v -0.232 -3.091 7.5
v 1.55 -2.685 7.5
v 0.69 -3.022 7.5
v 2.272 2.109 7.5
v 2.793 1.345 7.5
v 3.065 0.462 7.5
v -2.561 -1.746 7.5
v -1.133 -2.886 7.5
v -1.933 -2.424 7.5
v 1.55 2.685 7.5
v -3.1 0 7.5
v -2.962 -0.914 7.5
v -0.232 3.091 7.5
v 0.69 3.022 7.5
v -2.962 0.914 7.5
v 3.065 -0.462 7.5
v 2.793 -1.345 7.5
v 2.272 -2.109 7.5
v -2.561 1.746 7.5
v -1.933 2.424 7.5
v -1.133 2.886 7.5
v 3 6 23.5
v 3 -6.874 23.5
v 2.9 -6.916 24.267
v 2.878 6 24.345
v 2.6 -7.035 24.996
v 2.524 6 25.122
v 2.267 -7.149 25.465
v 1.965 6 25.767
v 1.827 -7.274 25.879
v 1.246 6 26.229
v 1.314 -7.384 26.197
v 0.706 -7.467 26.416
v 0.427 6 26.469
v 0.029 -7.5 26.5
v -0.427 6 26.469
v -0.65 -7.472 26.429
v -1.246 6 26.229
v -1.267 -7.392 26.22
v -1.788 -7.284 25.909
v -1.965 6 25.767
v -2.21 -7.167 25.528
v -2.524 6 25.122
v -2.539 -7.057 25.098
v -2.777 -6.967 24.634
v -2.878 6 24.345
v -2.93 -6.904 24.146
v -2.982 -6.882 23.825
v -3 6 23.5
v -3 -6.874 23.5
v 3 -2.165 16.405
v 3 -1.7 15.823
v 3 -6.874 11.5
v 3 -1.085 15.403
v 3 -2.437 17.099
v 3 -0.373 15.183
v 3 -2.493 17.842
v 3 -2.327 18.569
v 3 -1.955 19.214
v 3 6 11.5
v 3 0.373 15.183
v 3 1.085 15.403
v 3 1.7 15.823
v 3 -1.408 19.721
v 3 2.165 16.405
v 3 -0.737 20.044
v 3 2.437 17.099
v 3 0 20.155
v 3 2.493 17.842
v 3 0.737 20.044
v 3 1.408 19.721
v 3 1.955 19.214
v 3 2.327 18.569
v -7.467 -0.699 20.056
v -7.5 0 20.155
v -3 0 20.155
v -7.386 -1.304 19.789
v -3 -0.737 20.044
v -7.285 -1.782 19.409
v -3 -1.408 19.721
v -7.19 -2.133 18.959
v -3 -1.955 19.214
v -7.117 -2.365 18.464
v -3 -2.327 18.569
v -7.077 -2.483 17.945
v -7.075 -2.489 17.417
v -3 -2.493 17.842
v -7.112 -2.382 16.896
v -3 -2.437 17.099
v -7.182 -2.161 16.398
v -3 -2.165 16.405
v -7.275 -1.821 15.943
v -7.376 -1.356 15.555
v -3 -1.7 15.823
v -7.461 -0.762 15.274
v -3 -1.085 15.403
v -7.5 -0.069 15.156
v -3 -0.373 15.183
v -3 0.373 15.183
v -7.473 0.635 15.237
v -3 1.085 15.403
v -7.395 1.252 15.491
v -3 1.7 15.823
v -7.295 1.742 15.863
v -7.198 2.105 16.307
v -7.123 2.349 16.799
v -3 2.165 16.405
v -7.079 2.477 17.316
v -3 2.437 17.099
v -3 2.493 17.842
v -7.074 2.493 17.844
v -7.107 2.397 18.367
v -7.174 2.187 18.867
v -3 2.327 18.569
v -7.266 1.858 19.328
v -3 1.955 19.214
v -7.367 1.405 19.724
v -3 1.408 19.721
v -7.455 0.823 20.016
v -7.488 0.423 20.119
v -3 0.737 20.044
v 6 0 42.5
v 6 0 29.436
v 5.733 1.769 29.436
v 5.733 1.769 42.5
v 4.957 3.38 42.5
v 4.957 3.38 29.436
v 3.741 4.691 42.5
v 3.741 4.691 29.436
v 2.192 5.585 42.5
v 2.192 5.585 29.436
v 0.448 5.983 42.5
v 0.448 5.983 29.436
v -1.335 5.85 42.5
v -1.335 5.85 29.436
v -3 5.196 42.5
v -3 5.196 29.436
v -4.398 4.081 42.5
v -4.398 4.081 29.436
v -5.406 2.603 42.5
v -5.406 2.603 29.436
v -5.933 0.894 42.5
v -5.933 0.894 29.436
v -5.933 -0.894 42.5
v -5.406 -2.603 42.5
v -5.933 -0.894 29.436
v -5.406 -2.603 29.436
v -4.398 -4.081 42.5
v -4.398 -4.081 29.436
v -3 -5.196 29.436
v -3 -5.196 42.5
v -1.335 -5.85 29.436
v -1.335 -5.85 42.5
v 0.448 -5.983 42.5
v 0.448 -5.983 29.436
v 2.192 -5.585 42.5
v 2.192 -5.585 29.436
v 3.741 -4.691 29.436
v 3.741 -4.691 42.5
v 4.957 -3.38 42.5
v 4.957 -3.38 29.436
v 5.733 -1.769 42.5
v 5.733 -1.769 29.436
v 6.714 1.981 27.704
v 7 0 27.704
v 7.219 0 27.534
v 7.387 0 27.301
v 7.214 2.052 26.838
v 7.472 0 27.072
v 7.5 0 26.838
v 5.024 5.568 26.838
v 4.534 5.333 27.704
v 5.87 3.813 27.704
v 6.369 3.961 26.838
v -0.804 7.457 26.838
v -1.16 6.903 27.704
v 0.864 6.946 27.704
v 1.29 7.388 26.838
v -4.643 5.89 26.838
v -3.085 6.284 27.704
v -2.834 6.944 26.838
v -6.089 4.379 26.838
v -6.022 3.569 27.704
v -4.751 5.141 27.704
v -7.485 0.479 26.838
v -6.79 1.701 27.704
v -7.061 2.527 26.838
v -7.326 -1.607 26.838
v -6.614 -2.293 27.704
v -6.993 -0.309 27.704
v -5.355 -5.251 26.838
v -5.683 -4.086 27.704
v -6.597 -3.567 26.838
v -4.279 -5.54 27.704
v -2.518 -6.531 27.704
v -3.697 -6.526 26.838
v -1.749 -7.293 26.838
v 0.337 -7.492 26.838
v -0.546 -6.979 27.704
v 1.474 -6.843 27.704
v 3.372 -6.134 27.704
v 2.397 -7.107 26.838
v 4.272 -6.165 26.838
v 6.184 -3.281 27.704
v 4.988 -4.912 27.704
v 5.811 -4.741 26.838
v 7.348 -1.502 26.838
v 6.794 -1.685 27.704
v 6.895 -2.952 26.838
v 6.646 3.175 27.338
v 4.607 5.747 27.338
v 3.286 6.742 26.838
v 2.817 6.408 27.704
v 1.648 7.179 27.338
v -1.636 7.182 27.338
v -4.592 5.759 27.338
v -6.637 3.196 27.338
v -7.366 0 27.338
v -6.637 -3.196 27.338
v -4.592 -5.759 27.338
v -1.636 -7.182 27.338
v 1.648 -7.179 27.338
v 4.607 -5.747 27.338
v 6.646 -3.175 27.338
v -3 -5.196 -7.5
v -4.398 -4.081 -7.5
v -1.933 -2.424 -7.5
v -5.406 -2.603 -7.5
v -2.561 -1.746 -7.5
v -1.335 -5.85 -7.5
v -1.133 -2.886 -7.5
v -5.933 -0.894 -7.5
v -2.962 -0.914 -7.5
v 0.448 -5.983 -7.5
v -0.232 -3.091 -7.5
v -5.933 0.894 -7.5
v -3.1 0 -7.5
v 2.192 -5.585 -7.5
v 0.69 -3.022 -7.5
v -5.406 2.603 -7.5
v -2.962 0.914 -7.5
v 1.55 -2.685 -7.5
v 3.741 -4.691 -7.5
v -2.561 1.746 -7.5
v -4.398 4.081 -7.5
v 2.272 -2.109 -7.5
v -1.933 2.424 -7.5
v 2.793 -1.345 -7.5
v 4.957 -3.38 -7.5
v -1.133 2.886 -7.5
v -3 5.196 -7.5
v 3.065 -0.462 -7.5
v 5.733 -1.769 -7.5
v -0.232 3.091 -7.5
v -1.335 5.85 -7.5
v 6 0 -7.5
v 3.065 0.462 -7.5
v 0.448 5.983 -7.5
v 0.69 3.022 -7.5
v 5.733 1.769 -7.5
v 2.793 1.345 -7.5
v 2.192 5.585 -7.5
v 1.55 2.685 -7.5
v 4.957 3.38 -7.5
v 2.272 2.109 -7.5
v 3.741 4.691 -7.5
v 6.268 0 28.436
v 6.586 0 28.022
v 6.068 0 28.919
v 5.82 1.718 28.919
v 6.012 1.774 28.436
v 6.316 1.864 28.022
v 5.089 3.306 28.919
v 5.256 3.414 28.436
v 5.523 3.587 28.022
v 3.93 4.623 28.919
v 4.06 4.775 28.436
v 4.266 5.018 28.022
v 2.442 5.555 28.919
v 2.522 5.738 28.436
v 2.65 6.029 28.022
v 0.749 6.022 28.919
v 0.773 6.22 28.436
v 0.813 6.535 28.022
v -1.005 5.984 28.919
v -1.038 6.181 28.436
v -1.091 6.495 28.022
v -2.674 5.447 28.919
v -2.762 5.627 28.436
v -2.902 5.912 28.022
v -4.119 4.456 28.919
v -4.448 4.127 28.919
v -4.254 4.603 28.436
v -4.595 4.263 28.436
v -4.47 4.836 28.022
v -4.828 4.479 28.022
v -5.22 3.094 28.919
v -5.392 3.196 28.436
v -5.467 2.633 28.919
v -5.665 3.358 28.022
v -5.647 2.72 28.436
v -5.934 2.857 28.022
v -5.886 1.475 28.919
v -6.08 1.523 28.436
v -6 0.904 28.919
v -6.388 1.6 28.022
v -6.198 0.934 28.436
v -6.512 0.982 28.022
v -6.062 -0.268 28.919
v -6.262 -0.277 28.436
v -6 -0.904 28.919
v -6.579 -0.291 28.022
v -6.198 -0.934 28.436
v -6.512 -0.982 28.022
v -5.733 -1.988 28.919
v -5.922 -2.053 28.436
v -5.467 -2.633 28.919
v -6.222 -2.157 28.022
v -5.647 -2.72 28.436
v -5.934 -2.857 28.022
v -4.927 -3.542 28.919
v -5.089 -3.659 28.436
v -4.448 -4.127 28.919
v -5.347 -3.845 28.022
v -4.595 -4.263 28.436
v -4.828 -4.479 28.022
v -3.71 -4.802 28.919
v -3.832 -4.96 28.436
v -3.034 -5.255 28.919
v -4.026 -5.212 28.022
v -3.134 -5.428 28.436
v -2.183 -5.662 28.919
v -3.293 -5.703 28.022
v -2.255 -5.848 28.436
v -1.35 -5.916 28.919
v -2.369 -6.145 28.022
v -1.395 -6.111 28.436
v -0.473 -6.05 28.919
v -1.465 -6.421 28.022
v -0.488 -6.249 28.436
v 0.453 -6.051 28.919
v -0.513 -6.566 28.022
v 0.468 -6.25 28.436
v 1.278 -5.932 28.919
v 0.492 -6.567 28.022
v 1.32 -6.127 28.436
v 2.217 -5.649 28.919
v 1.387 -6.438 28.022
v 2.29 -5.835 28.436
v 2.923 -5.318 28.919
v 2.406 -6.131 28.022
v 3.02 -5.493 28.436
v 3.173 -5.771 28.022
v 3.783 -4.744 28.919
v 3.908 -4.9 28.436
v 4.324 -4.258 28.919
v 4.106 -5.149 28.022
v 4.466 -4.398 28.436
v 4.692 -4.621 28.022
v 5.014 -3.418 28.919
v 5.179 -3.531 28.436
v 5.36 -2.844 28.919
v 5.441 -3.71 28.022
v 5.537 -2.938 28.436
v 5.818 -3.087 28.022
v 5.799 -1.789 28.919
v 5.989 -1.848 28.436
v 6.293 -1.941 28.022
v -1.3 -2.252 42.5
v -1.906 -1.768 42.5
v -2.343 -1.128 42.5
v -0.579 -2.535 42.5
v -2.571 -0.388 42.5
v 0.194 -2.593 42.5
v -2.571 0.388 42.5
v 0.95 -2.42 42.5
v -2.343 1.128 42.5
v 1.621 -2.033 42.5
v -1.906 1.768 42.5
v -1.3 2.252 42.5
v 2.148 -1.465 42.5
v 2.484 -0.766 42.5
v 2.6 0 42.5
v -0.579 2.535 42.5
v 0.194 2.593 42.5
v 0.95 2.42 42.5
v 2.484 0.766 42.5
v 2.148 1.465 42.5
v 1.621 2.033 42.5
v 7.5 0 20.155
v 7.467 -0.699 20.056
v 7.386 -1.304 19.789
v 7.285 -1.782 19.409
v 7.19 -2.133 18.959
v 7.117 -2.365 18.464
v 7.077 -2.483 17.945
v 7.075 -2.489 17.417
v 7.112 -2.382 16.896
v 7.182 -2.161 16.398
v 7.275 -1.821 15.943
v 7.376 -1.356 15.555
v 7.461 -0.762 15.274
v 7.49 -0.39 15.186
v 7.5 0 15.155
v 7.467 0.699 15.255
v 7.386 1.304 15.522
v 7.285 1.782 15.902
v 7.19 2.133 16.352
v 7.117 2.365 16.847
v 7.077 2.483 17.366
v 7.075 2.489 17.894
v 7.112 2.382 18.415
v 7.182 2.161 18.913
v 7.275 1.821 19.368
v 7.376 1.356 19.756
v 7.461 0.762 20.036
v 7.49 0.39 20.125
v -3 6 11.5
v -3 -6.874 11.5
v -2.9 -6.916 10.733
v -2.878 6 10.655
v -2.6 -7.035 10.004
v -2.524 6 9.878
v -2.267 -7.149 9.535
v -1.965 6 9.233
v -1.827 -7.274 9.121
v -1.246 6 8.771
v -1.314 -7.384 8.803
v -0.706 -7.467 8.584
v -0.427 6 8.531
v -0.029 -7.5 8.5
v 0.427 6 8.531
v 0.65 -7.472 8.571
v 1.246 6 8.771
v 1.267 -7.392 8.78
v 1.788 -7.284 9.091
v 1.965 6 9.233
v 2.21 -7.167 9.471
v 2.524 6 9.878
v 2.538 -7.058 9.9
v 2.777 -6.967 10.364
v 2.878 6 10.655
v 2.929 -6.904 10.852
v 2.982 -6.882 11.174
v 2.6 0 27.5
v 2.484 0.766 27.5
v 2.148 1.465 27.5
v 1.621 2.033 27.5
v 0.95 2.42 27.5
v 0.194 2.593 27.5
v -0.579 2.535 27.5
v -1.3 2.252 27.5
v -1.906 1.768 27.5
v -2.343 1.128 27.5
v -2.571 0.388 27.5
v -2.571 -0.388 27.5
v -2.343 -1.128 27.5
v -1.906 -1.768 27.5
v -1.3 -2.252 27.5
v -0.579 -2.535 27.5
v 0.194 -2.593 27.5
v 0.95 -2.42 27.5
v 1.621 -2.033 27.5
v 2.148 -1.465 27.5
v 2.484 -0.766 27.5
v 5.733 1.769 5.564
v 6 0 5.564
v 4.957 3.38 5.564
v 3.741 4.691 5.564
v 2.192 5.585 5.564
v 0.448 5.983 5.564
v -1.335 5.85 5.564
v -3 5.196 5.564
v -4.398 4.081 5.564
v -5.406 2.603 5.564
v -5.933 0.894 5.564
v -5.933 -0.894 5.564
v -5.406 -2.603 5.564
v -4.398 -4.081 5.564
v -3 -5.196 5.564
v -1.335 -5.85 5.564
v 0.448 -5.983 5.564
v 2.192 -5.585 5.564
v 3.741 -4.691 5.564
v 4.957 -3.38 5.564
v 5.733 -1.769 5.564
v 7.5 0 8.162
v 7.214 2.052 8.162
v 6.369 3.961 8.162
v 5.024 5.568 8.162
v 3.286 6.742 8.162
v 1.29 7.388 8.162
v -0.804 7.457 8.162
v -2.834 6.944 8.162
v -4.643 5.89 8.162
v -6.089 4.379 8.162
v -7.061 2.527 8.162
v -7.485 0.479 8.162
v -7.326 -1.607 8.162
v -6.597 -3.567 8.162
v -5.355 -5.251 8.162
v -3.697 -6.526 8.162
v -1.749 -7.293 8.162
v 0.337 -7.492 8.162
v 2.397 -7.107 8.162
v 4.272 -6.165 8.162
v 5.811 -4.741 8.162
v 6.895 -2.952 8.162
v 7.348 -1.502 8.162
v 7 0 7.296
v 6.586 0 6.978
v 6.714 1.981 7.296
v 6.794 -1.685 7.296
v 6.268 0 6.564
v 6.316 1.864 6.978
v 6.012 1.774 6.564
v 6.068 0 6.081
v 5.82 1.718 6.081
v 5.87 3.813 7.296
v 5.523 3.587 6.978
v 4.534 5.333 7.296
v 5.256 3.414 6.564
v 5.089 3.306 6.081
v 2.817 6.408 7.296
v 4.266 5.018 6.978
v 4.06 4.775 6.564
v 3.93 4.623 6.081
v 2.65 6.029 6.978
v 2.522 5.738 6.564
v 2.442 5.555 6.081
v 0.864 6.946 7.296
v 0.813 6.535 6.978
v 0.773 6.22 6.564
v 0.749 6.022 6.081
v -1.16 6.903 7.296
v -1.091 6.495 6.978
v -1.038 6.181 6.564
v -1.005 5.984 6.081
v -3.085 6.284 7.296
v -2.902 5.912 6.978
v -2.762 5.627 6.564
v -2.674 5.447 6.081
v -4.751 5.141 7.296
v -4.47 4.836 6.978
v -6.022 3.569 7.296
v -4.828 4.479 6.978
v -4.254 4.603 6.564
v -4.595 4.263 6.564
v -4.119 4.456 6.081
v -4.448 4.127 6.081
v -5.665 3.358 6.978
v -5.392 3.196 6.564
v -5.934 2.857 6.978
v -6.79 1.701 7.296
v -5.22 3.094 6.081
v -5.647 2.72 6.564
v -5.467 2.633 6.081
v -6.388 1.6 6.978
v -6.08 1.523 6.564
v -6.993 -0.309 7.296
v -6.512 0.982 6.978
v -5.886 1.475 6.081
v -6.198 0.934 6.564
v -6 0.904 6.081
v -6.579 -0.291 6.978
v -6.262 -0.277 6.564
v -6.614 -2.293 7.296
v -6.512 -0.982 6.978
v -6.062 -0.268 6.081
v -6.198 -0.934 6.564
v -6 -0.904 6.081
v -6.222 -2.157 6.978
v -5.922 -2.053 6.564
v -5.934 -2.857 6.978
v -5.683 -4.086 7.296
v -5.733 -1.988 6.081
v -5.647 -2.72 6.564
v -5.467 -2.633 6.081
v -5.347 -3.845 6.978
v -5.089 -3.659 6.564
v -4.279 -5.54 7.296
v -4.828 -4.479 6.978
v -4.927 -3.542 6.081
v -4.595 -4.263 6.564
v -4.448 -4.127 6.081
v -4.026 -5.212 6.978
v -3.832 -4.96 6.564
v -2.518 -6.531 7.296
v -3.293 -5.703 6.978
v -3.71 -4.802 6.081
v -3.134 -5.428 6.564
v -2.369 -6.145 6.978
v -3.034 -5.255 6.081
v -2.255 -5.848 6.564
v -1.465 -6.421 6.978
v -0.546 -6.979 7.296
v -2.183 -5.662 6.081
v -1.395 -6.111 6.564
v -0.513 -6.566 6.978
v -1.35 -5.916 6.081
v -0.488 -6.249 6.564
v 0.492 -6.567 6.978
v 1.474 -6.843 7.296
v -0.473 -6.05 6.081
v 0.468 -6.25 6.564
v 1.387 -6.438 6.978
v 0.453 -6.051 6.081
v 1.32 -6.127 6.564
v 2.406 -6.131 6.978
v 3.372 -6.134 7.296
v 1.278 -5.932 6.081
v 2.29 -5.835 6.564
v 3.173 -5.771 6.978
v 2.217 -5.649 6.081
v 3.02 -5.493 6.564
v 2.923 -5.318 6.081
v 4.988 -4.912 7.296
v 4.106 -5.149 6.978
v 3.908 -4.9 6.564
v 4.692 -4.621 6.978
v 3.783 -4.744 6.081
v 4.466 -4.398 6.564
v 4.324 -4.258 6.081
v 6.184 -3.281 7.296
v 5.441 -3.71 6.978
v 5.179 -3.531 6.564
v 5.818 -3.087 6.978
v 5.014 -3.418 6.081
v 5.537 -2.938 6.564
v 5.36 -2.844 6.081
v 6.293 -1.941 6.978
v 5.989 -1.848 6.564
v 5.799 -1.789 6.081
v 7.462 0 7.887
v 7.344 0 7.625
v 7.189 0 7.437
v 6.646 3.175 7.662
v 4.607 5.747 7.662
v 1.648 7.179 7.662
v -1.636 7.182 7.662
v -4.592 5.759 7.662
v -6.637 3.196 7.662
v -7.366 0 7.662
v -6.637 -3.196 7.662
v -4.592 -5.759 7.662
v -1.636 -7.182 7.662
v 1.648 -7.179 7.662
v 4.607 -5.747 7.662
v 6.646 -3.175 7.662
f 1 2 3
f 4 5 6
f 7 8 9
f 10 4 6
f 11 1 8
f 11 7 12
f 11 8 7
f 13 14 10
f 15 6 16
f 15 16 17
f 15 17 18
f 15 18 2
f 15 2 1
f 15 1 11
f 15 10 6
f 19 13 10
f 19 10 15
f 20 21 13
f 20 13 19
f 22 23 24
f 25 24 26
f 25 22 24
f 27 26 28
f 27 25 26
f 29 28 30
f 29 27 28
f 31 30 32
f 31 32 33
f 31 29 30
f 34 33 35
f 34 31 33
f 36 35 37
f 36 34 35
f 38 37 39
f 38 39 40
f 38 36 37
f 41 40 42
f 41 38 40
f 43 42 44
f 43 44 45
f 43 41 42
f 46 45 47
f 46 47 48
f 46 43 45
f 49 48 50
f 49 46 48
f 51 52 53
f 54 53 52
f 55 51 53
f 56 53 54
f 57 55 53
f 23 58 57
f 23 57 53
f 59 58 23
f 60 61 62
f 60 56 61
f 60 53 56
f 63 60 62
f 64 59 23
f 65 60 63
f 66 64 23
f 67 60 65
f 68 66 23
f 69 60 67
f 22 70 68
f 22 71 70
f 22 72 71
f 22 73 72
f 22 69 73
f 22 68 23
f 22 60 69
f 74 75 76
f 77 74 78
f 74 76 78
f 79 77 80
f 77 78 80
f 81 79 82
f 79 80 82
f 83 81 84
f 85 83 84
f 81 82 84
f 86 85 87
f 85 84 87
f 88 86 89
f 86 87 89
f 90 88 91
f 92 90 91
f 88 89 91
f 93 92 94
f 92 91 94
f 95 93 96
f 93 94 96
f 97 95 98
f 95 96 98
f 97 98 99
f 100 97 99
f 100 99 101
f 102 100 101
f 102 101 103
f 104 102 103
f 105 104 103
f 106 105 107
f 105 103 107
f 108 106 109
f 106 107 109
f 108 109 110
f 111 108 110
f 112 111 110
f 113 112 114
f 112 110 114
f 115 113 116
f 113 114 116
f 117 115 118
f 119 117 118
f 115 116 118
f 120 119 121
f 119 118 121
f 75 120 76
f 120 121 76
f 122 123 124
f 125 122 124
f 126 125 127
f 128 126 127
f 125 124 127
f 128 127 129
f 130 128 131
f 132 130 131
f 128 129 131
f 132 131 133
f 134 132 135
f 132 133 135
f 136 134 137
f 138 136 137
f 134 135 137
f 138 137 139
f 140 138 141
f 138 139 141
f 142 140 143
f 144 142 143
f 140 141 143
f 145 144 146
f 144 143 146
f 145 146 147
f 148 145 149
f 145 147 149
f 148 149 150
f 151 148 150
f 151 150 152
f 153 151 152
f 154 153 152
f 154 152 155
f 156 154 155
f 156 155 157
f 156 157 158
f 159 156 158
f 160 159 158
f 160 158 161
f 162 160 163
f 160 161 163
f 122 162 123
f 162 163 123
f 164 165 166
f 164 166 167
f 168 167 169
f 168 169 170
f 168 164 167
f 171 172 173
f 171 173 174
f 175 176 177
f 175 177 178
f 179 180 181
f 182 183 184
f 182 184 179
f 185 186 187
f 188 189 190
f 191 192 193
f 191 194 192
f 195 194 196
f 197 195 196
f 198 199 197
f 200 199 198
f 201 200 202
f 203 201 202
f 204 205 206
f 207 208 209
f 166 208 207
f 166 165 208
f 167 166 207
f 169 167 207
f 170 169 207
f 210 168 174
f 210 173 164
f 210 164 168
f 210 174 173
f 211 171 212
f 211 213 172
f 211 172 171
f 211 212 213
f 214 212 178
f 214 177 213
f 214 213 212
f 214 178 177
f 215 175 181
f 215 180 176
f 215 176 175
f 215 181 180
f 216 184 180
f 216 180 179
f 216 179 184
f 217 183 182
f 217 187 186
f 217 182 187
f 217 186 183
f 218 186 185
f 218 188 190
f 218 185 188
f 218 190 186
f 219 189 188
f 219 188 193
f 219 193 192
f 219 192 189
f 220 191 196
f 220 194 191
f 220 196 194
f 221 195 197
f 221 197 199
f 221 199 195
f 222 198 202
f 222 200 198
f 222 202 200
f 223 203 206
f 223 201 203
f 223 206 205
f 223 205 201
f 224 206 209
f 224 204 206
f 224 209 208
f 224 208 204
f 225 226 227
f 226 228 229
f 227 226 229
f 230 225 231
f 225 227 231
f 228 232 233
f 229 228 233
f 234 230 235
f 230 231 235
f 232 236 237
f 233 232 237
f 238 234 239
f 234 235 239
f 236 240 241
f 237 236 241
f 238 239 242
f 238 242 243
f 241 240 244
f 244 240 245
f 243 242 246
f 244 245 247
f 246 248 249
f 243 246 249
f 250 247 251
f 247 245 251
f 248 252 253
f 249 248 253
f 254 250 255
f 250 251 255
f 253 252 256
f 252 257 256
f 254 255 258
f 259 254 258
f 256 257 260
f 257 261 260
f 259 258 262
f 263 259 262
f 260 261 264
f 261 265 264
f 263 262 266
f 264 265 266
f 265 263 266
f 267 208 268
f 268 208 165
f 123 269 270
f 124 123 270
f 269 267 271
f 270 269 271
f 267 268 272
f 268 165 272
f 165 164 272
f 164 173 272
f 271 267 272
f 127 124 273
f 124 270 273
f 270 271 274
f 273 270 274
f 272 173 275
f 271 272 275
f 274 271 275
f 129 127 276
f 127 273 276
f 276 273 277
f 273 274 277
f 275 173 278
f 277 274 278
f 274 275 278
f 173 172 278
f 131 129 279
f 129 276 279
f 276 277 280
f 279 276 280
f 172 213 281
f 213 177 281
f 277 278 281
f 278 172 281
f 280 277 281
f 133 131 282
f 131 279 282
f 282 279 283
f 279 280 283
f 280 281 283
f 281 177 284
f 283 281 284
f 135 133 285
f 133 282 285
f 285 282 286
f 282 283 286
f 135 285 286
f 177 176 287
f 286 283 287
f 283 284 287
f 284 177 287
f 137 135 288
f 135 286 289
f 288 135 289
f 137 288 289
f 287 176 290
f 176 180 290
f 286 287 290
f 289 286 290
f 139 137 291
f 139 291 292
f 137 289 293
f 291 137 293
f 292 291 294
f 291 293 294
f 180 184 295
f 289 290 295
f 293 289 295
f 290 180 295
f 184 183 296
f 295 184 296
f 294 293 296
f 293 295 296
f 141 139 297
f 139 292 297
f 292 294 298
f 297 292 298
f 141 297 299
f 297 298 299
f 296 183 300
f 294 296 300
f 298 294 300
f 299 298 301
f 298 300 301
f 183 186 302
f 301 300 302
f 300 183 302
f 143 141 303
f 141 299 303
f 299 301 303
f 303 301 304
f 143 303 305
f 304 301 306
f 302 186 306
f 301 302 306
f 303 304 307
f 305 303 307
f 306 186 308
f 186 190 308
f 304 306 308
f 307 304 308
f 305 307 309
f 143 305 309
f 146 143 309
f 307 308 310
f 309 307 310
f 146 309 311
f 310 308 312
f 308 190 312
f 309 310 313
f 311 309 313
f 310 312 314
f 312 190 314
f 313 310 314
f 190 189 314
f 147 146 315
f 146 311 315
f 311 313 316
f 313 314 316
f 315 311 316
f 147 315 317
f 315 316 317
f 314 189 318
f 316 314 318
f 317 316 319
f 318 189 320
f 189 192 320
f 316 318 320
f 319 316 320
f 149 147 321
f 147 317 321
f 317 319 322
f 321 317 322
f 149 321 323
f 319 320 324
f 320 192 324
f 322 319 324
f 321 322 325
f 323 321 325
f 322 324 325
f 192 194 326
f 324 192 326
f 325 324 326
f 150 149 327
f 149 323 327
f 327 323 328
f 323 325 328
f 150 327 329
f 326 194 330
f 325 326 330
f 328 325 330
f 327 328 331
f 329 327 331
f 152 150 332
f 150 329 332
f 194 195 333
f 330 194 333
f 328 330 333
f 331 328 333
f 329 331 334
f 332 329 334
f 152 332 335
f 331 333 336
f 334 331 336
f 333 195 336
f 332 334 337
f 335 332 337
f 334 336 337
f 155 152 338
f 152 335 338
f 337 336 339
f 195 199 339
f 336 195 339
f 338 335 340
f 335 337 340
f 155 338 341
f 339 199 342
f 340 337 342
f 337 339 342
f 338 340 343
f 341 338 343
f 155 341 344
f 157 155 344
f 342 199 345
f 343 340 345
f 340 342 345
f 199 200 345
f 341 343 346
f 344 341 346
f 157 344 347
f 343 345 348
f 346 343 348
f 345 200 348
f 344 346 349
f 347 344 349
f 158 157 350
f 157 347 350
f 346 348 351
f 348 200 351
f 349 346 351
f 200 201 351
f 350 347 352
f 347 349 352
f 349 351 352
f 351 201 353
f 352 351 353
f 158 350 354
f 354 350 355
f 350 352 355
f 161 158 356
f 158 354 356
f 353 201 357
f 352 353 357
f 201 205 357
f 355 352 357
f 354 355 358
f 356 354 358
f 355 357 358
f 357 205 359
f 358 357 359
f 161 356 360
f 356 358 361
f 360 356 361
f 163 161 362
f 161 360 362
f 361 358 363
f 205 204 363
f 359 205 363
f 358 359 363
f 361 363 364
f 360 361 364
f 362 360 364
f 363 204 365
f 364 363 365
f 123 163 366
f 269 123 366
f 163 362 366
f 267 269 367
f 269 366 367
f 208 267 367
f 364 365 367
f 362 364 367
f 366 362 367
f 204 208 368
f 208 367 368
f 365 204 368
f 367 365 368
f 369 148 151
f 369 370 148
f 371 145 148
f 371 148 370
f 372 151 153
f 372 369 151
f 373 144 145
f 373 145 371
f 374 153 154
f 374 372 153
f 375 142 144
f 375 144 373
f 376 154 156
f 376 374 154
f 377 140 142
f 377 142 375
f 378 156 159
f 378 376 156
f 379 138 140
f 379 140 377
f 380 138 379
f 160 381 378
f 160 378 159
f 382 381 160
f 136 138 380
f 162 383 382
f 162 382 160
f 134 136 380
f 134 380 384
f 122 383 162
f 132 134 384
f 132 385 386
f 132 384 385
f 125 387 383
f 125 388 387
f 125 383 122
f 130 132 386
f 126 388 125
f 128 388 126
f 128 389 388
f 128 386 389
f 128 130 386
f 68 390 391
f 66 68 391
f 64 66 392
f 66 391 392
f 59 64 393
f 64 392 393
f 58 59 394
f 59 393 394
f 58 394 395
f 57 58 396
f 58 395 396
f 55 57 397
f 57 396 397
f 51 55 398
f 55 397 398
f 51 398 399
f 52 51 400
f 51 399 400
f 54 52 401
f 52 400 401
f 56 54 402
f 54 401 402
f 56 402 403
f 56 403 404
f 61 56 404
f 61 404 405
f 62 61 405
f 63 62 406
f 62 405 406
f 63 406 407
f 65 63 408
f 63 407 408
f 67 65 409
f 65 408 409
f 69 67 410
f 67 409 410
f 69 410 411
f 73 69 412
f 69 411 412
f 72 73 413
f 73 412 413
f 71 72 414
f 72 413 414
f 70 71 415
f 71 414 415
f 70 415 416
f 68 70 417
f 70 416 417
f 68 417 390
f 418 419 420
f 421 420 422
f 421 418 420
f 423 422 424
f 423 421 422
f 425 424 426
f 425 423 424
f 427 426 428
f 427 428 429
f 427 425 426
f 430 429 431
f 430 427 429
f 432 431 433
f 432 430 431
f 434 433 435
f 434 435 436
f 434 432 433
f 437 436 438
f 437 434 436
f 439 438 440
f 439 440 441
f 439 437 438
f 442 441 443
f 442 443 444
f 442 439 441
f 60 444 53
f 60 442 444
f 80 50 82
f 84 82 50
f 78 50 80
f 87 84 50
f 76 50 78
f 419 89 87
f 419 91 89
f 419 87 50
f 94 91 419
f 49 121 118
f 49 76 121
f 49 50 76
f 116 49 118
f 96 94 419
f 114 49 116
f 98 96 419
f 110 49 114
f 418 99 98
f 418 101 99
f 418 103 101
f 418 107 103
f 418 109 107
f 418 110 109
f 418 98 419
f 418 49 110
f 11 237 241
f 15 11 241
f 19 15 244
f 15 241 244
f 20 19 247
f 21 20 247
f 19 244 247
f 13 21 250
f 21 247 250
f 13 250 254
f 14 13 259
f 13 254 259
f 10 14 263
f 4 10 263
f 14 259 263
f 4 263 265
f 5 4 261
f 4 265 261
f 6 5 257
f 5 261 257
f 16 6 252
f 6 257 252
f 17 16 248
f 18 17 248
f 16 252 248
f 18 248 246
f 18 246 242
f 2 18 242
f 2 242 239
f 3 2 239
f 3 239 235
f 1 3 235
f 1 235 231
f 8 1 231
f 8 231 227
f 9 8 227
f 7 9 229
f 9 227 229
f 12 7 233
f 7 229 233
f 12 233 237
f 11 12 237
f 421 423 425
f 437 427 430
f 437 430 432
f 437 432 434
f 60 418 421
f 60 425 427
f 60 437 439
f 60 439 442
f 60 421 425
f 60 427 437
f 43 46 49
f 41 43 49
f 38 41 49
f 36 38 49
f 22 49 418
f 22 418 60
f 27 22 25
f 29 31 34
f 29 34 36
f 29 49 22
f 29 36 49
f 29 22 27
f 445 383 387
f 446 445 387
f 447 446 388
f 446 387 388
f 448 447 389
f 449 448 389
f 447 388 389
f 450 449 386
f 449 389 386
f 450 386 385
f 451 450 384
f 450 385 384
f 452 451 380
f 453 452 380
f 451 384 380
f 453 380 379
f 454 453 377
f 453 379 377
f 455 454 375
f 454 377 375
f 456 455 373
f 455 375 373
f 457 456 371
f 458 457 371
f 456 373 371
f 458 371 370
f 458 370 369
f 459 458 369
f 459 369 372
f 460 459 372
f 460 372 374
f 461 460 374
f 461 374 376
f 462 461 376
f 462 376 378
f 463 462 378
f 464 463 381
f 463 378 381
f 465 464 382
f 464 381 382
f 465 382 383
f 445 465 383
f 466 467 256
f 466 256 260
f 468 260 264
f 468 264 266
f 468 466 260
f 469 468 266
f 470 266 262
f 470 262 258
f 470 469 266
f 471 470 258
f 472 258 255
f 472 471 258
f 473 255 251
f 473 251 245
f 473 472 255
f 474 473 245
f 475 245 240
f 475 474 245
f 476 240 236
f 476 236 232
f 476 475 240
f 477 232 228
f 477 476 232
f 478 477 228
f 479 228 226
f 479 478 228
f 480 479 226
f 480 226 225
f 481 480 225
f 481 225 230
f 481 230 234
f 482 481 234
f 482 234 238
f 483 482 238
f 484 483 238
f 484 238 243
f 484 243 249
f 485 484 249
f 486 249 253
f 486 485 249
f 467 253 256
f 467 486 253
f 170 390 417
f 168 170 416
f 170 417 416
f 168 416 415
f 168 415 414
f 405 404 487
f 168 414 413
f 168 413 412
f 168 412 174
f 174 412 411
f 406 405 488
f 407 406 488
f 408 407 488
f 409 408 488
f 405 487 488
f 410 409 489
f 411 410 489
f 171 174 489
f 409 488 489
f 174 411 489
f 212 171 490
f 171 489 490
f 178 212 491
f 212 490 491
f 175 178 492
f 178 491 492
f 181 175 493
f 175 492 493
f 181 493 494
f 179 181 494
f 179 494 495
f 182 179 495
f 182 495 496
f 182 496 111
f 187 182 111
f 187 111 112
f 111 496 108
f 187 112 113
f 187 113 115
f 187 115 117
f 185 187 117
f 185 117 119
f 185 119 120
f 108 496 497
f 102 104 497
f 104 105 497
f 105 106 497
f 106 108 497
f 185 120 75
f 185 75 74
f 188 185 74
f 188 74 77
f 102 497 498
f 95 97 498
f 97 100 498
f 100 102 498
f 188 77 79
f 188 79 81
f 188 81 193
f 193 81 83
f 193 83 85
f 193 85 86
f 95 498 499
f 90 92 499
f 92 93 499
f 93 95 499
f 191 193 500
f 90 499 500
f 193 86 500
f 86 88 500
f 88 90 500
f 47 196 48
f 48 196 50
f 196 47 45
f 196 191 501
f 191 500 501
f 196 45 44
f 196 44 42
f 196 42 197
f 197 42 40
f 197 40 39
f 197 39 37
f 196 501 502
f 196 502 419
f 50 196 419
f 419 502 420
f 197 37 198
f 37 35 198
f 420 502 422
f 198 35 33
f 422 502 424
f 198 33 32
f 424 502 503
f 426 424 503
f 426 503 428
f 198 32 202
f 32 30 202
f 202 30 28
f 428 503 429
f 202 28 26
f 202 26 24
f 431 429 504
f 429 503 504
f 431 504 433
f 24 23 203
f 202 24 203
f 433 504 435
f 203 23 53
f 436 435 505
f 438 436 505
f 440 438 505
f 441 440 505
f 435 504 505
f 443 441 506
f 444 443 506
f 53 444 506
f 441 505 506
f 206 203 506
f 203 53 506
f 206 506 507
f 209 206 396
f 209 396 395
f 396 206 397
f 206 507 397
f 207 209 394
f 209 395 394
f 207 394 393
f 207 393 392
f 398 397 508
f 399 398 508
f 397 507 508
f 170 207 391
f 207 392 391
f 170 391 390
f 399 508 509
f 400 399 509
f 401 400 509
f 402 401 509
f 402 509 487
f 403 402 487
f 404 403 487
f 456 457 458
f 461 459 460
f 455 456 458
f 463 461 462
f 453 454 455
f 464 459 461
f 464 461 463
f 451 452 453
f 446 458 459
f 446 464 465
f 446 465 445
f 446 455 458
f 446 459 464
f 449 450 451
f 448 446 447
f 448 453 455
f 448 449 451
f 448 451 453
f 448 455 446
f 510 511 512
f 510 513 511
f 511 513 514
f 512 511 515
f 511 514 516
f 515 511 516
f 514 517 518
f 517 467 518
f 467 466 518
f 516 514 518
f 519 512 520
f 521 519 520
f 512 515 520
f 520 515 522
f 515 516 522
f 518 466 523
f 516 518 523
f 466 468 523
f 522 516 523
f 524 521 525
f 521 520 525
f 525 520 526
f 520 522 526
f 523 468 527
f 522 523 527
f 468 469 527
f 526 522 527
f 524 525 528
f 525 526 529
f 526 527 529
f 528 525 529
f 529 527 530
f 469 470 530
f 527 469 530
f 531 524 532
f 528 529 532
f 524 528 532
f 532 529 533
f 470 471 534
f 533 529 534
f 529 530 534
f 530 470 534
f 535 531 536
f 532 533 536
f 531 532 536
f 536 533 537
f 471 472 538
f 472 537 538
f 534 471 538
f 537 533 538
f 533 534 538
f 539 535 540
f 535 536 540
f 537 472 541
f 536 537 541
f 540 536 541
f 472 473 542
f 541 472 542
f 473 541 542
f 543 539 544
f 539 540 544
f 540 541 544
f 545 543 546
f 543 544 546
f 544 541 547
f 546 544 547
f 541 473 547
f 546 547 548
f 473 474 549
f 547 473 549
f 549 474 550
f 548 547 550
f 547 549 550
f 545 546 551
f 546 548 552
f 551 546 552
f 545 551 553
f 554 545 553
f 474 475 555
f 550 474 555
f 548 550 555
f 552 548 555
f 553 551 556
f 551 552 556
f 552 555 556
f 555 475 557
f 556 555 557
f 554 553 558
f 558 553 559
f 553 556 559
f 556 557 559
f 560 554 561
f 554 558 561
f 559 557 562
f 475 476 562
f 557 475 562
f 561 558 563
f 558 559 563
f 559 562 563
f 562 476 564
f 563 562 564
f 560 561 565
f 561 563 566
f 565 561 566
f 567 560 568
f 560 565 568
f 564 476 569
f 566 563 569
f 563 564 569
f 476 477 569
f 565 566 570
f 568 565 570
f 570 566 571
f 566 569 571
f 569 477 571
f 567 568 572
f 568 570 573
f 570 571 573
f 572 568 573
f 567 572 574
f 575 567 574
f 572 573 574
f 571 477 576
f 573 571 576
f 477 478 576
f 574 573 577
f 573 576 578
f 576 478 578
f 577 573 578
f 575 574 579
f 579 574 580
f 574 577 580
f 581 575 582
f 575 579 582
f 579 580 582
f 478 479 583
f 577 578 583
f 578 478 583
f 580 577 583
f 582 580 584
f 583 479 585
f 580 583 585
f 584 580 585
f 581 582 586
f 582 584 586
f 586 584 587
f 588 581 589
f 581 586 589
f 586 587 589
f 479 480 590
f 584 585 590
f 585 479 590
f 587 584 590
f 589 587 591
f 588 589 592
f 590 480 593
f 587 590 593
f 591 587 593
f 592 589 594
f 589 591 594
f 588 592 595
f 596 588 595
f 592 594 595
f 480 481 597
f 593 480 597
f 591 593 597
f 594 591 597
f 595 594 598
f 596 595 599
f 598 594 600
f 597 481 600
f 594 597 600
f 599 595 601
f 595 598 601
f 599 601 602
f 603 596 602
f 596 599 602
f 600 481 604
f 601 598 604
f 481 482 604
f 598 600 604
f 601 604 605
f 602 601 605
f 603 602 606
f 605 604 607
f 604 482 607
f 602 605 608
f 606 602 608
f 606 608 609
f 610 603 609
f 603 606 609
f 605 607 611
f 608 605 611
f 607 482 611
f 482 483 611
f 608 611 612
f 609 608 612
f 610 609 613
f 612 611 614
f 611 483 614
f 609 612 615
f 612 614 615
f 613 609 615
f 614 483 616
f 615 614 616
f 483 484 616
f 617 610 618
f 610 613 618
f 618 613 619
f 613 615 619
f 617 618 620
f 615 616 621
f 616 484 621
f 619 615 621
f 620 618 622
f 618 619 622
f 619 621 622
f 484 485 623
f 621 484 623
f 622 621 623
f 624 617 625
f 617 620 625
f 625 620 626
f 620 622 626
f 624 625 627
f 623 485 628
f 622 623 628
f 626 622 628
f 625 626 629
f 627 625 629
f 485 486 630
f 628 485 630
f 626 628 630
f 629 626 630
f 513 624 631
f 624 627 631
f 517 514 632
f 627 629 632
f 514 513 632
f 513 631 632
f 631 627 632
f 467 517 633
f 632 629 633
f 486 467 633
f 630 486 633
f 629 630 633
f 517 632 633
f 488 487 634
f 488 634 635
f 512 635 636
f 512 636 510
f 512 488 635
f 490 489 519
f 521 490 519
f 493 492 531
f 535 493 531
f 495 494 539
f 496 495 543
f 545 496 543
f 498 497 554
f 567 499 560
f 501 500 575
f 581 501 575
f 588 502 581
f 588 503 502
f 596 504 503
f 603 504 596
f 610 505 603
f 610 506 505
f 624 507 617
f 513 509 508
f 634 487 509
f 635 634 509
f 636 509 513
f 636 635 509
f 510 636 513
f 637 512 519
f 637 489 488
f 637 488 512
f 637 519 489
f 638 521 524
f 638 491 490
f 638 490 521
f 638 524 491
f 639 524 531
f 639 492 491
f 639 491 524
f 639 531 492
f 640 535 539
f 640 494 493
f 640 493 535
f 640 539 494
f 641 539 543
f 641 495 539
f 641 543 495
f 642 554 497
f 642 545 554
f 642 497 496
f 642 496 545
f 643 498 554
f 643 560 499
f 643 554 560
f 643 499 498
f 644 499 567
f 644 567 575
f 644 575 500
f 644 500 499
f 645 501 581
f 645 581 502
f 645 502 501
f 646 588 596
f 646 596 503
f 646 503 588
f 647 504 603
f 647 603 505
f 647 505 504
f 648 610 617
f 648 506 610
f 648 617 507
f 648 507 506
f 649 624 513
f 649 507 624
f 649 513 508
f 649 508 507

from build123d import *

# Parameters (mm, degrees)
SKETCH1_R           = 6
BOSS_EXTRUDE1_DEPTH = 7.5
SKETCH2_R           = 7.5
BOSS_EXTRUDE2_DEPTH = 20
SKETCH3_R           = 3.1
CUT_EXTRUDE1_DEPTH  = 15
SKETCH4_R           = 2.5
CUT_EXTRUDE2_DEPTH  = 11
CUT_EXTRUDE3_DEPTH  = 20
FILLET1_R           = 2
FILLET2_R           = 1
SKETCH7_R           = 2.6
CUT_EXTRUDE4_DEPTH  = 15
CUT_EXTRUDE5_START  = -6
CUT_EXTRUDE5_DEPTH  = 6


with BuildPart() as part:
    # Sketch1 → Boss-Extrude1 (new, symmetric)
    with BuildSketch(Plane.XY):
        Circle(SKETCH1_R)
    boss_extrude1 = extrude(amount=BOSS_EXTRUDE1_DEPTH, both=True)

    # Sketch2 → Boss-Extrude2 (add)
    with BuildSketch(Plane.XY.offset(7.5)):
        Circle(SKETCH2_R)
    extrude(amount=BOSS_EXTRUDE2_DEPTH)

    # Mirror1: Boss-Extrude1 across plane
    add(boss_extrude1.mirror(Plane.XY.offset(17.5)))

    # Sketch3 → Cut-Extrude1 (cut)
    with BuildSketch(Plane(origin=(0, 0, -7.5), x_dir=(-1, 0, 0), z_dir=(0, 0, -1))):
        Circle(SKETCH3_R)
    extrude(amount=-CUT_EXTRUDE1_DEPTH, mode=Mode.SUBTRACT)

    # Sketch4 → Cut-Extrude2 (cut, symmetric)
    with BuildSketch(Plane(origin=(0, 0, 0), x_dir=(0, 0, -1), z_dir=(1, 0, 0))):
        with Locations(Location((-17.655484387, 0, 0), (0, 0, 180))):
            Circle(SKETCH4_R)
    extrude(amount=CUT_EXTRUDE2_DEPTH, both=True, mode=Mode.SUBTRACT)

    # Sketch6 → Cut-Extrude3 (cut)
    with BuildSketch(Plane(origin=(0, 0, 0), x_dir=(1, 0, 0), z_dir=(0, 1, 0))):
        with BuildLine():
            Line((3, -11.5), (3, -23.5))
            ThreePointArc((3, -23.5), (0, -26.5), (-3, -23.5))
            Line((-3, -23.5), (-3, -11.5))
            ThreePointArc((-3, -11.5), (0, -8.5), (3, -11.5))
        make_face()
    extrude(amount=-CUT_EXTRUDE3_DEPTH, mode=Mode.SUBTRACT)

    # Fillet1
    # the kernel refuses this fillet: 2 mm, written as the material it adds along each edge
    with BuildSketch(Plane(origin=(0, 0, 7.5), x_dir=(1, 0, 0), z_dir=(0, -1, 0))) as fillet1_piece_1:
        with BuildLine():
            CenterArc((8, -1.936491673), FILLET1_R, 104.477512186, 75.522487814)
            Line((6, -1.936491673), (5.96, -1.936491673))
            Line((5.96, -1.936491673), (5.96, 0))
            Line((5.96, 0), (6, 0.04))
            ThreePointArc((6, 0.04), (6.75, 0.04), (7.49, 0.038729833))
            Line((7.49, 0.038729833), (7.5, 0))
        make_face()
    revolve(axis=Axis((0, 0, 7.5), (0, 0, 1)))
    with BuildSketch(Plane(origin=(0, 0, 27.5), x_dir=(1, 0, 0), z_dir=(0, -1, 0))) as fillet1_piece_2:
        with BuildLine():
            CenterArc((8, 1.936491673), FILLET1_R, 180, 75.522487814)
            Line((6, 1.936491673), (5.96, 1.936491673))
            Line((5.96, 1.936491673), (5.96, 0))
            Line((5.96, 0), (6, -0.04))
            ThreePointArc((6, -0.04), (6.75, -0.04), (7.49, -0.038729833))
            Line((7.49, -0.038729833), (7.5, 0))
        make_face()
    revolve(axis=Axis((0, 0, 27.5), (0, 0, 1)))

    # Fillet2
    fillet2_edges = [part.edges().sort_by_distance(p)[0] for p in [
        (-7.5, 0, 7.5),
        (-7.5, 0, 27.5),
    ]]
    fillet(fillet2_edges, radius=FILLET2_R)

    # Sketch7 → Cut-Extrude4 (cut)
    with BuildSketch(Plane.XY.offset(42.5)):
        Circle(SKETCH7_R)
    extrude(amount=-CUT_EXTRUDE4_DEPTH, mode=Mode.SUBTRACT)

    # Sketch8 → Cut-Extrude5 (cut)
    with BuildSketch(Plane.XZ.offset(CUT_EXTRUDE5_START)):
        with BuildLine():
            Line((3, 20.155484387), (-3, 20.155484387))
            Line((-3, 20.155484387), (-3, 15.155484387))
            Line((-3, 15.155484387), (-3, 11.5))
            ThreePointArc((-3, 11.5), (0, 8.5), (3, 11.5))
            Line((3, 11.5), (3, 15.155484387))
            Line((3, 15.155484387), (3, 20.155484387))
        make_face()
        with BuildLine():
            Line((-3, 20.155484387), (3, 20.155484387))
            Line((3, 20.155484387), (3, 23.5))
            ThreePointArc((3, 23.5), (0, 26.5), (-3, 23.5))
            Line((-3, 23.5), (-3, 20.155484387))
        make_face()
    extrude(amount=CUT_EXTRUDE5_DEPTH, mode=Mode.SUBTRACT)


solid = part.part
